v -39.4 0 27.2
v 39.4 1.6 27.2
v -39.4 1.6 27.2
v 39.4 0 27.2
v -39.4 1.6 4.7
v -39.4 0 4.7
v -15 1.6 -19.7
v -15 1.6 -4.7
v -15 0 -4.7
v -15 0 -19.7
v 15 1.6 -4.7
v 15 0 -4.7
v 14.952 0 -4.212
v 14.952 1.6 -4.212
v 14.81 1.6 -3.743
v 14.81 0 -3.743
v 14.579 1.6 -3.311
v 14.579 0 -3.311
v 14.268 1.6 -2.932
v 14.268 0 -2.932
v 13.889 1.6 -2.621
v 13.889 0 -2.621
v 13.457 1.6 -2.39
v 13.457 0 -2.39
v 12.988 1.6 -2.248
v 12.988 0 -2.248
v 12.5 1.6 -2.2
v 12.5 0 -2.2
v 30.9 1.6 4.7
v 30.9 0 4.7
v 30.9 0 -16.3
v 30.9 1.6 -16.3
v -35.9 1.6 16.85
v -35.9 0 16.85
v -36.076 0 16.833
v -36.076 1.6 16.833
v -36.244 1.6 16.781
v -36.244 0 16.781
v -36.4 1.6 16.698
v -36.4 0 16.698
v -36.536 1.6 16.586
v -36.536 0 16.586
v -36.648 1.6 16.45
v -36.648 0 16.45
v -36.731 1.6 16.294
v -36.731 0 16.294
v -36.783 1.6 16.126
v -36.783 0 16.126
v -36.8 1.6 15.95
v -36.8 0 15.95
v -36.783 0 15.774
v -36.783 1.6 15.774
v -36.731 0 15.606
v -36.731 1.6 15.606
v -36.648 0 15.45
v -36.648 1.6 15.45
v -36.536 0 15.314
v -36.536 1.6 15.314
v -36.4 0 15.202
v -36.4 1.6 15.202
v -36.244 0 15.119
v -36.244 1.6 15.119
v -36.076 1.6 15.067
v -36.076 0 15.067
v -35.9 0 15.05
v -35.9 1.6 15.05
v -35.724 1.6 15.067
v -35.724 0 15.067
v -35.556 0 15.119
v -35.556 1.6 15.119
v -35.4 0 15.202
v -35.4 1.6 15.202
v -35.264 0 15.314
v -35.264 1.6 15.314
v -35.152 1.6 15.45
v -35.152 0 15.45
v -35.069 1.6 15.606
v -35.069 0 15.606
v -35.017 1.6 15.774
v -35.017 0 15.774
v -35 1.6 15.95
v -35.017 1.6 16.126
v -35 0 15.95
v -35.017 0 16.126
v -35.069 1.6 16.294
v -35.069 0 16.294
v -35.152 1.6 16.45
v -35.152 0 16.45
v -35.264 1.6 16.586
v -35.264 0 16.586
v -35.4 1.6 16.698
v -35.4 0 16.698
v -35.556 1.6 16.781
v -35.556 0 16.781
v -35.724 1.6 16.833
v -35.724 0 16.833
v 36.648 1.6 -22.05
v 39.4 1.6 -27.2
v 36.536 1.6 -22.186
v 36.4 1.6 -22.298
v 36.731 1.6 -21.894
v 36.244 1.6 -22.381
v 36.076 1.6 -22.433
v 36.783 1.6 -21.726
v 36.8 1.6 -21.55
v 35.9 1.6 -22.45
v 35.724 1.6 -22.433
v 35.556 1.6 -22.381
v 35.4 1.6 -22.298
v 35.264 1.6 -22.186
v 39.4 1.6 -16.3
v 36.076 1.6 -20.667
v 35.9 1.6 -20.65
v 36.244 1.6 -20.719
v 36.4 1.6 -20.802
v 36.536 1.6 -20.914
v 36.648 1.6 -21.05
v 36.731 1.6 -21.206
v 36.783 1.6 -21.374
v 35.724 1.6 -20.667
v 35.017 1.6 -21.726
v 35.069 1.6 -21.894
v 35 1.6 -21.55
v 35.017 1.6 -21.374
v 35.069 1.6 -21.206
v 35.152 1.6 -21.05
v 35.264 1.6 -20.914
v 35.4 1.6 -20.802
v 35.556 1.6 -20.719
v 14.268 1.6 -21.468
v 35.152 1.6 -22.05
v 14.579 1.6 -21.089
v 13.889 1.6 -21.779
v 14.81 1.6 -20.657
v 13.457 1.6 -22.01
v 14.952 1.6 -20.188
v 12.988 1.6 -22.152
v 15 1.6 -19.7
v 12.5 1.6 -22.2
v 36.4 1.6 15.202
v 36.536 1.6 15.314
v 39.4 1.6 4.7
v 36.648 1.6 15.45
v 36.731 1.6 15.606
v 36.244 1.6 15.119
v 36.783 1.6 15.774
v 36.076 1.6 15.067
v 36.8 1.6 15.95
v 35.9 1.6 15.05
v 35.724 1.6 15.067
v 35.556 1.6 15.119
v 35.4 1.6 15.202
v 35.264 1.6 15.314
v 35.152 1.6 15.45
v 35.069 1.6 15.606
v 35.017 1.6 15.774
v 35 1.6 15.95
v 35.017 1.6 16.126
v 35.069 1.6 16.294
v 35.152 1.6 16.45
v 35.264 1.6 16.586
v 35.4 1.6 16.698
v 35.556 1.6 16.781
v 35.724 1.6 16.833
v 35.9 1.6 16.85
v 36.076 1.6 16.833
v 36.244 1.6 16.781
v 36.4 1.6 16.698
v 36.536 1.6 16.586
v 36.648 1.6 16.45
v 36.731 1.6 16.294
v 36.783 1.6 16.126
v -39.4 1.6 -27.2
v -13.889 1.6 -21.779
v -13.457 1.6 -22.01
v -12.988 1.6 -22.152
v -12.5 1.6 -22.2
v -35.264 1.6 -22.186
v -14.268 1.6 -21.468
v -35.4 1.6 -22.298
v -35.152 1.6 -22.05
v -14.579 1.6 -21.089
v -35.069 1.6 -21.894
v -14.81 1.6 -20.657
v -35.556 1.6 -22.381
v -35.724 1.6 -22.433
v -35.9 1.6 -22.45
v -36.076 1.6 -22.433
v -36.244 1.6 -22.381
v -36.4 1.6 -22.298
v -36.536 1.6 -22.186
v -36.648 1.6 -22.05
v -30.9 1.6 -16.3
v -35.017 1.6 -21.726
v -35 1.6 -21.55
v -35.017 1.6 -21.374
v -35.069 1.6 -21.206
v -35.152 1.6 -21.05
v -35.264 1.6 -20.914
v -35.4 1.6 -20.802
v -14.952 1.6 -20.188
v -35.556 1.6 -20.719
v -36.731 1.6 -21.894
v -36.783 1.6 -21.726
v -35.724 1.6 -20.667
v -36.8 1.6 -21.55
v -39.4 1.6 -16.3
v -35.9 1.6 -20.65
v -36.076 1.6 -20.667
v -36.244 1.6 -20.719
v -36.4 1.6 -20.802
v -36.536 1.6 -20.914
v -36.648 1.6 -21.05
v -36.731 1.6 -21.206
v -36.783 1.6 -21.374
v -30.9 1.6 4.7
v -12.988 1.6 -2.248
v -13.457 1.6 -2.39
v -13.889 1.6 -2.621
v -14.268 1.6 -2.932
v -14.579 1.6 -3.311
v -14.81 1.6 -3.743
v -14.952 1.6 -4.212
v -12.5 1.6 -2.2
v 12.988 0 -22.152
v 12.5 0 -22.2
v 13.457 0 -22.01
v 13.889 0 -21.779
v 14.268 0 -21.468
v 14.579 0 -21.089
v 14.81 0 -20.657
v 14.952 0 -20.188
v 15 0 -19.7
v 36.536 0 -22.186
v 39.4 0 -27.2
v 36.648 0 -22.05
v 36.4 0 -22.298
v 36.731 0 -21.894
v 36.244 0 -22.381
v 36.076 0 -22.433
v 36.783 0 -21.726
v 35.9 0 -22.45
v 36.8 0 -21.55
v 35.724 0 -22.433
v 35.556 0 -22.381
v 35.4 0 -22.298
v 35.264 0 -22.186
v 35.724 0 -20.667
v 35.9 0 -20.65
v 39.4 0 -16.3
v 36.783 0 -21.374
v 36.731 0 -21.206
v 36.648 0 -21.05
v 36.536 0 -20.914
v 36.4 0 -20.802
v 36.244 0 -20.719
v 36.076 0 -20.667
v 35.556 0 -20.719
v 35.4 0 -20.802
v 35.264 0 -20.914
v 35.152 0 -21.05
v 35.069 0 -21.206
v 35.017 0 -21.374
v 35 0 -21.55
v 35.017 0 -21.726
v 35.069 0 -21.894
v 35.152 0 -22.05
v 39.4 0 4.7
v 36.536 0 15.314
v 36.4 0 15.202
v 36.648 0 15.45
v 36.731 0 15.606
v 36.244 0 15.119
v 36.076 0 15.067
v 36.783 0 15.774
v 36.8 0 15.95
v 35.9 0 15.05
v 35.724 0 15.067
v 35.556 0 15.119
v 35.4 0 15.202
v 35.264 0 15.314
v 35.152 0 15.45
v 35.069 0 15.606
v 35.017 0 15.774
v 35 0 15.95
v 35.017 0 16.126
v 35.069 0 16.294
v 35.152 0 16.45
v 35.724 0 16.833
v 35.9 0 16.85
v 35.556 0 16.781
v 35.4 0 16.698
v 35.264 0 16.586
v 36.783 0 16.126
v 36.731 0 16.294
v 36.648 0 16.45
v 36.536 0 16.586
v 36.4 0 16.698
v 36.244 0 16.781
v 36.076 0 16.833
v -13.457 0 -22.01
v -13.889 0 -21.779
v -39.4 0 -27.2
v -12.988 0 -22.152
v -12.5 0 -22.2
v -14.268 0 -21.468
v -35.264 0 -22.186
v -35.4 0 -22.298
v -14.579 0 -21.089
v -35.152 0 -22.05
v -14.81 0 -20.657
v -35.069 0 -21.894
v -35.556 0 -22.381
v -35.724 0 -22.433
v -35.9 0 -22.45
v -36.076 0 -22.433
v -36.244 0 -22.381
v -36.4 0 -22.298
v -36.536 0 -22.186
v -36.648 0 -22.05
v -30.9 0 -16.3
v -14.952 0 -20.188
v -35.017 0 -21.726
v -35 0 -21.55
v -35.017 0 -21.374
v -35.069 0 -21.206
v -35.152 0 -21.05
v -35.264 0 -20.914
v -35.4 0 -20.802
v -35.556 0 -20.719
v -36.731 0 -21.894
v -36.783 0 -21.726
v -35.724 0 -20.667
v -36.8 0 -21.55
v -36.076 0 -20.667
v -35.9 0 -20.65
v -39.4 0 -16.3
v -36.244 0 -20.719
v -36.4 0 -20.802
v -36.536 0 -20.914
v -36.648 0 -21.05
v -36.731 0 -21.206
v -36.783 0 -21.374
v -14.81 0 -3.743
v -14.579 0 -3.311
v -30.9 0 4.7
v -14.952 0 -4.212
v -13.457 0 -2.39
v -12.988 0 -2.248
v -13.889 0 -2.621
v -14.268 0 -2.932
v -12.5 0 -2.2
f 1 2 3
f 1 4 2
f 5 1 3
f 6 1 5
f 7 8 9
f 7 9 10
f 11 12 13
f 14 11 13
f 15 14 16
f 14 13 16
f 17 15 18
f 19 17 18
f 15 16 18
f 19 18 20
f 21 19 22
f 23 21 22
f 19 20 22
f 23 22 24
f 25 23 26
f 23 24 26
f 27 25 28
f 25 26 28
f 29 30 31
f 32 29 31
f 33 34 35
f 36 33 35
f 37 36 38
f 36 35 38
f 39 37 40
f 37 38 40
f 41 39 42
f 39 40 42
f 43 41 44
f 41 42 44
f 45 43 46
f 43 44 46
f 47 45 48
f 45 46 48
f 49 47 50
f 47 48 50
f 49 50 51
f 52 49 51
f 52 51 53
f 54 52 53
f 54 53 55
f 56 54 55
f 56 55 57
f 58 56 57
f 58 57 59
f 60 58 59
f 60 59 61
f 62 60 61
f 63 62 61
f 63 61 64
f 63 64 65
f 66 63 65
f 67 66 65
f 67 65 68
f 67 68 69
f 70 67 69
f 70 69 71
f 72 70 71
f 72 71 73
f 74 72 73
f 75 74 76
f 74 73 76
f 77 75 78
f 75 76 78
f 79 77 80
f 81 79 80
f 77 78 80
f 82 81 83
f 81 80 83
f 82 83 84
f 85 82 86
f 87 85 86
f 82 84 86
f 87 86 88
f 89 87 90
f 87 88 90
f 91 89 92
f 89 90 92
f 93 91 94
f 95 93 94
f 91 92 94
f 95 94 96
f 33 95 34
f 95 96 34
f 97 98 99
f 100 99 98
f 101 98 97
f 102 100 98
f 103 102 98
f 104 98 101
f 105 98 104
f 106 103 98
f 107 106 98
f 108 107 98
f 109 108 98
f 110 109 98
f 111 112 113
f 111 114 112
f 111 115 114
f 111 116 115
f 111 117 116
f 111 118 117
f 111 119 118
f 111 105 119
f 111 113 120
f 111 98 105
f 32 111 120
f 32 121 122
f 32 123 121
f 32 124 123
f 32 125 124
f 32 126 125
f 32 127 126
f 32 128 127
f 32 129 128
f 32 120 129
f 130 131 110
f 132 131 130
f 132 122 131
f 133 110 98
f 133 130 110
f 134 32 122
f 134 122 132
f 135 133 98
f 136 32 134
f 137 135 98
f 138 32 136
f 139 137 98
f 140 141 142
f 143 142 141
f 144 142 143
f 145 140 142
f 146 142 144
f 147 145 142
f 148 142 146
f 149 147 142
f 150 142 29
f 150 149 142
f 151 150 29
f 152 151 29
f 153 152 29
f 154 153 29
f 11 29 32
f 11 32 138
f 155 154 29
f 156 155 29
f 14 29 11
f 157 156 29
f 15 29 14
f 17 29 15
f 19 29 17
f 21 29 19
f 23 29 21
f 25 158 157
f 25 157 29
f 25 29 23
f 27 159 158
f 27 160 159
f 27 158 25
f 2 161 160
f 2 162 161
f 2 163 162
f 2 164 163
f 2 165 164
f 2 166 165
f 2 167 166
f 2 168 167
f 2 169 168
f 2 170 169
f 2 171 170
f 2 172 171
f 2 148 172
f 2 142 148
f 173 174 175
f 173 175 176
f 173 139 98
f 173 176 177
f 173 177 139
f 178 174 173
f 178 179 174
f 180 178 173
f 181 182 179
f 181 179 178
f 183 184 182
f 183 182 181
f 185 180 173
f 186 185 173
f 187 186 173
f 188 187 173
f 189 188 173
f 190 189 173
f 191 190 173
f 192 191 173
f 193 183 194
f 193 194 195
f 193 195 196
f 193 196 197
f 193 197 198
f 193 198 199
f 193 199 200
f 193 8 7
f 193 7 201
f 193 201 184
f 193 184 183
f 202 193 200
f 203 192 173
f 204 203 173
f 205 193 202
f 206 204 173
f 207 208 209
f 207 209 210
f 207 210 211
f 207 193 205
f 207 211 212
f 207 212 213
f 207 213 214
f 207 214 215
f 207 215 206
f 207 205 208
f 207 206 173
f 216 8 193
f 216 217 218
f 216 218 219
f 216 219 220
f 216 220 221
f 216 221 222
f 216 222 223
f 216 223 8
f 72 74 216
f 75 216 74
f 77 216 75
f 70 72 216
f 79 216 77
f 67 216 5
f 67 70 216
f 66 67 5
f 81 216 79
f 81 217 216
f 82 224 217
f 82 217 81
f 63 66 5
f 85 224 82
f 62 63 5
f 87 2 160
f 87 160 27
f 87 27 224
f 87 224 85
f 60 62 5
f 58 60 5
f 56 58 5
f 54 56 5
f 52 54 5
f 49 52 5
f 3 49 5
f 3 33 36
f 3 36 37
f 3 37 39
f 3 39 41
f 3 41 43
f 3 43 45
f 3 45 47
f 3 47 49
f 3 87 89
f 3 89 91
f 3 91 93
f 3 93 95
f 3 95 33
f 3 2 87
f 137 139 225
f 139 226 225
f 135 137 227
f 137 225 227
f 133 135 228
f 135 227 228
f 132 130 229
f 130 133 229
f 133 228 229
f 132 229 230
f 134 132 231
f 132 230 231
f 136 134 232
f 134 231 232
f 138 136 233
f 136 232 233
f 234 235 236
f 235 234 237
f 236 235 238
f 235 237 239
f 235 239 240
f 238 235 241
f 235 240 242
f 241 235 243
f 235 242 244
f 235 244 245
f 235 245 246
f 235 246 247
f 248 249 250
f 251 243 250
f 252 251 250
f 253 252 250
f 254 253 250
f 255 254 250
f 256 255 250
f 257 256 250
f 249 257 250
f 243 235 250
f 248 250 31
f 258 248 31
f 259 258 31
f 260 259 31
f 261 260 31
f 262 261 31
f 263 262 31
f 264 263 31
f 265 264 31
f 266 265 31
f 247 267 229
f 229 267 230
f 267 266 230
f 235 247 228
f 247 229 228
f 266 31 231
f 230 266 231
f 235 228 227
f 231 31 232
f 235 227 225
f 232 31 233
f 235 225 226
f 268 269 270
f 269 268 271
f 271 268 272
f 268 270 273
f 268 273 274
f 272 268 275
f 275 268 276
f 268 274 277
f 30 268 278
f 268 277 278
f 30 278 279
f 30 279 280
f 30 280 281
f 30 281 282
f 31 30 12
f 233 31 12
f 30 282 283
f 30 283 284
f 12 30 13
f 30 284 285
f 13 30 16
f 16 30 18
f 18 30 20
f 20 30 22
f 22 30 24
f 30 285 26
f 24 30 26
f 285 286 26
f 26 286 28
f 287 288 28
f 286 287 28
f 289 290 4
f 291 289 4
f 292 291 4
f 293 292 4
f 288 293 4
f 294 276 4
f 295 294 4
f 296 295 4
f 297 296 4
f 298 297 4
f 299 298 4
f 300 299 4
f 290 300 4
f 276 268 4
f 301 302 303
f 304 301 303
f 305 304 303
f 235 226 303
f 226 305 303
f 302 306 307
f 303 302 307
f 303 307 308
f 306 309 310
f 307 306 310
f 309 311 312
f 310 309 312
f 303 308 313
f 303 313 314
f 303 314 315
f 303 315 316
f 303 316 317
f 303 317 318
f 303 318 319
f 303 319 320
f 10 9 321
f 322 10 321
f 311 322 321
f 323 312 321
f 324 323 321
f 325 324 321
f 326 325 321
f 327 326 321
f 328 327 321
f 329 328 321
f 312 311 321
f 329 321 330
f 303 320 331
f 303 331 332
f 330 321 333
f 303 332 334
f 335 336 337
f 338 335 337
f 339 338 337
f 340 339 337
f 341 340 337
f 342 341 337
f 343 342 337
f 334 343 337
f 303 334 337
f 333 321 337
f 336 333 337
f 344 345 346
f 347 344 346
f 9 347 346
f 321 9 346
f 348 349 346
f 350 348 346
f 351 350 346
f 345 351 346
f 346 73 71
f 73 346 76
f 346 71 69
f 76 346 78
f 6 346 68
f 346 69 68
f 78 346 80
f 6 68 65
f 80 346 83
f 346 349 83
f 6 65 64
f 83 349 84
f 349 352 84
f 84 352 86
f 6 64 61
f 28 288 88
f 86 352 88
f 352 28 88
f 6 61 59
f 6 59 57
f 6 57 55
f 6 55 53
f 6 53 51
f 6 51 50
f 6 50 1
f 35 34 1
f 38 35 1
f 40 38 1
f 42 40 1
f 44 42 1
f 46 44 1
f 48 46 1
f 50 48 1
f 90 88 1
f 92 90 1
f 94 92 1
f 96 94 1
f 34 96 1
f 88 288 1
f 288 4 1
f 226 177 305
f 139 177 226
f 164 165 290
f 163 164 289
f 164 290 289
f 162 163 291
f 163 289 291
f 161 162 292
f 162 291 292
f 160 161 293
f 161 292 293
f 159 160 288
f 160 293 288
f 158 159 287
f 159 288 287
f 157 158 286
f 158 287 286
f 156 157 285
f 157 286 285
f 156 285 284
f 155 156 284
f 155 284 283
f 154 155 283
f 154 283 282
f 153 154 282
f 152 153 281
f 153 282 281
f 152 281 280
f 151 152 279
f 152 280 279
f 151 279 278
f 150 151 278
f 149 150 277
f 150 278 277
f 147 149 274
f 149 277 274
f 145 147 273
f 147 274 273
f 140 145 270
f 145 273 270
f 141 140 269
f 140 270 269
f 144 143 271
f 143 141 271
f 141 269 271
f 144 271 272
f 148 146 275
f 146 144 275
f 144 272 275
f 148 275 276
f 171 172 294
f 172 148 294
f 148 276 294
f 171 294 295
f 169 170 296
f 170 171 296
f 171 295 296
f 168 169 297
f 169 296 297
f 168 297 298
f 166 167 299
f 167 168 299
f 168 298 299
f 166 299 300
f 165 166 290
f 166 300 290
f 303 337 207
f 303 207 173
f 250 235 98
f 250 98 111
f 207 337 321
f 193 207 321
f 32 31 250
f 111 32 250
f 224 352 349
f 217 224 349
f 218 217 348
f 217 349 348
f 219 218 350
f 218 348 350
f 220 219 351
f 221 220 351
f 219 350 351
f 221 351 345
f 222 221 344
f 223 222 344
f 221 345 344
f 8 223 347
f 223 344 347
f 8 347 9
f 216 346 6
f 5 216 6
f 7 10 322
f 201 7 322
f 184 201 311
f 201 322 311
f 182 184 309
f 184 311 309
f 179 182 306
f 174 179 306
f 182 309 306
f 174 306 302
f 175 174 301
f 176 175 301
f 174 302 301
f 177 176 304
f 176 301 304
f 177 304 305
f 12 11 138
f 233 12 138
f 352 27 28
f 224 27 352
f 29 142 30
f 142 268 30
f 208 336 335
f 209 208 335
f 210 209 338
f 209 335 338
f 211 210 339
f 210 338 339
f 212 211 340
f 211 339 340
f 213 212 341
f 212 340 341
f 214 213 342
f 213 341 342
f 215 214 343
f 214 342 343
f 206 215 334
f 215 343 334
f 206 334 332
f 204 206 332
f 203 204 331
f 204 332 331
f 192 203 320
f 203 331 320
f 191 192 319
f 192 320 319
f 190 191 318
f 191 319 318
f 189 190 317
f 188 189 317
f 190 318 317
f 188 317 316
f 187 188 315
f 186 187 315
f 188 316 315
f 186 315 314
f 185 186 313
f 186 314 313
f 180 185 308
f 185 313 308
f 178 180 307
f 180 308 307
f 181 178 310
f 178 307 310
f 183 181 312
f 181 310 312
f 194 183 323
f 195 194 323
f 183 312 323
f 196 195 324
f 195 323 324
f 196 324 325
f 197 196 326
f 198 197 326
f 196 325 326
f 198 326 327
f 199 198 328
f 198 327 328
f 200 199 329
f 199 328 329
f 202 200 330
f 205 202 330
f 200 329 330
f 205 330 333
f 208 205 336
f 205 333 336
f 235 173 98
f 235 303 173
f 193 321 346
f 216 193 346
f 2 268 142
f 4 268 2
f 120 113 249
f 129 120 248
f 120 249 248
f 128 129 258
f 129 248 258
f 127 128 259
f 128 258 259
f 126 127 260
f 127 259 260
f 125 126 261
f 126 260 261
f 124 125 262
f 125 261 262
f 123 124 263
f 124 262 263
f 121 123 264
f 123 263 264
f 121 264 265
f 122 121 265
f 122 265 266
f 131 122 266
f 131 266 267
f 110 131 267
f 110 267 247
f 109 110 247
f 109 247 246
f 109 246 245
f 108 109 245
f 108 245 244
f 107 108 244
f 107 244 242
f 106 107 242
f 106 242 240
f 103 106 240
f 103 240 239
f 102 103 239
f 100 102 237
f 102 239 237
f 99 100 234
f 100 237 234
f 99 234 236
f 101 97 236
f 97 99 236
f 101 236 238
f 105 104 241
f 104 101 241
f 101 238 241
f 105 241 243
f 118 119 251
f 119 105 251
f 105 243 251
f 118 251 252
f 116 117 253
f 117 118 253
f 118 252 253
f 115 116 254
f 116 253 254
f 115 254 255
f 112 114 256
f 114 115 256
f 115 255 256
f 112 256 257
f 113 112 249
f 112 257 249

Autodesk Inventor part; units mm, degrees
ref_plane "YZ Plane" through (0, 0, 0) normal (1, 0, 0) x (0, 1, 0)
ref_plane "XZ Plane" through (0, 0, 0) normal (0, 1, 0) x (-1, 0, 0)
ref_plane "XY Plane" through (0, 0, 0) normal (0, 0, 1) x (1, 0, 0)
sketch "スケッチ1" plane through (0, 0, 0) normal (0, 1, 0) x (-1, 0, 0)
  line L0 (39.4, -27.2) -> (0, -27.2)
  line L1 (0, -27.2) -> (0, 27.2)
  line L2 (0, 27.2) -> (39.4, 27.2)
  line L3 (39.4, -16.3) -> (30.9, -16.3)
  line L4 (30.9, -16.3) -> (30.9, 4.7)
  line L5 (30.9, 4.7) -> (39.4, 4.7)
  line L6 (39.4, 4.7) -> (39.4, -16.3) construction
  line L7 (39.4, 27.2) -> (39.4, 4.7)
  line L8 (39.4, -16.3) -> (39.4, -27.2)
  point P0 (0, 0)
  point P1 (0, 0)
  dimension "d0" = 10.9
  dimension "d1" = 22.5
  dimension "d2" = 39.4
  dimension "d3" = 21
  dimension "d5" = 8.5
extrude "押し出し1" add sketch "スケッチ1" along normal blind 1.6
sketch "スケッチ2" plane through (0, 1.6, 0) normal (0, 1, 0) x (1, 0, 0)
  line L0 (-30.9, 16.3) -> (-30.9, -4.7) projected
  line L1 (-30.9, -4.7) -> (-39.4, -4.7) projected
  line L2 (-39.4, -4.7) -> (-39.4, -27.2) projected
  line L3 (-39.4, -27.2) -> (0, -27.2) projected
  line L4 (0, -27.2) -> (0, 27.2) projected
  line L5 (0, 27.2) -> (-39.4, 27.2) projected
  line L6 (-39.4, 27.2) -> (-39.4, 16.3) projected
  line L7 (-39.4, 16.3) -> (-30.9, 16.3) projected
  point P0 (0, 0)
  point P1 (-35.9, 21.55)
  point P2 (-35.9, -15.95)
  dimension "d8" = 11.25
  dimension "d9" = 5.25
  dimension "d10" = 3.5
  dimension "d11" = 3.5
hole "穴1" at (-35.9, 1.6, -21.55) at (-35.9, 1.6, 15.95) direction (0, -1, 0) diameter 1.8 end through all
mirror "ミラー1" about plane through (0, 0, 27.2) normal (1, 0, 0) of "押し出し1"
ref_plane "作業平面1" through (0, 0, 4.7) normal (-1, 0, 0) x (0, 0, 1)
mirror "ミラー2" about plane through (0, 0, 4.7) normal (-1, 0, 0) of "穴1", "押し出し1"
sketch "スケッチ3" plane through (0, 1.6, 0) normal (0, 1, 0) x (1, 0, 0)
  circle A0 centre (35.9, 21.55) radius 0.9 projected
  circle A1 centre (35.9, -15.95) radius 0.9 projected
  line L0 (-39.4, 27.2) -> (39.4, 27.2) projected
  line L1 (-39.4, 27.2) -> (-39.4, 16.3) projected
  line L2 (-39.4, 16.3) -> (-30.9, 16.3) projected
  line L3 (-30.9, 16.3) -> (-30.9, -4.7) projected
  line L4 (-30.9, -4.7) -> (-39.4, -4.7) projected
  line L5 (-39.4, -4.7) -> (-39.4, -27.2) projected
  line L6 (-39.4, -27.2) -> (39.4, -27.2) projected
  line L7 (39.4, -4.7) -> (39.4, -27.2) projected
  line L8 (30.9, -4.7) -> (39.4, -4.7) projected
  line L9 (30.9, 16.3) -> (30.9, -4.7) projected
  line L10 (39.4, 16.3) -> (30.9, 16.3) projected
  line L11 (39.4, 27.2) -> (39.4, 16.3) projected
  circle A2 centre (-35.9, 21.55) radius 0.9 projected
  circle A3 centre (-35.9, -15.95) radius 0.9 projected
  line L12 (-15, 22.2) -> (0, 22.2)
  line L13 (0, 22.2) -> (0, 2.2)
  line L14 (0, 2.2) -> (-15, 2.2)
  line L15 (-15, 2.2) -> (-15, 22.2)
  line L16 (15, 22.2) -> (0, 22.2)
  line L17 (0, 2.2) -> (15, 2.2)
  line L18 (15, 2.2) -> (15, 22.2)
  line L19 (-39.4, 16.3) -> (-30.9, 16.3) projected
  line L20 (-30.9, 16.3) -> (-30.9, -4.7)
  line L21 (30.9, 16.3) -> (30.9, -4.7) projected
  line L22 (30.9, -4.7) -> (30.9, 16.3)
  line L23 (-30.9, 16.3) -> (-30.9, -4.7) projected
  point P0 (0, 0)
  point P1 (0, 12.2)
  dimension "d19" = 30
  dimension "d21" = 20
  dimension "d26" = 5
  dimension "d28" = 39.4
extrude "押し出し2" cut sketch "スケッチ3" against normal blind 10 contours L12 L13 L14 L15 | L16 L18 L17 L13
fillet "フィレット1" radius 2.5 4 edges at (-15, 0.8, -22.2) (-15, 0.8, -2.2) (15, 0.8, -2.2) (15, 0.8, -22.2)
equation "\"d17\" = Thickness"
equation "\"BendRadius\" = Thickness"
equation "\"BendReliefWidth\" = Thickness"
equation "\"BendReliefDepth\" = 0.5 * Thickness"
equation "\"CornerReliefSize\" = 4 * Thickness"
equation "\"MinimumRemnant\" = 2 * Thickness"
equation "\"TransitionRadius\" = BendRadius"
equation "\"JacobiRadiusSize\" = BendRadius"
equation "\"GapSize\" = Thickness"
equation "\"Thickness\" = 0.5"
properties part number "old"
